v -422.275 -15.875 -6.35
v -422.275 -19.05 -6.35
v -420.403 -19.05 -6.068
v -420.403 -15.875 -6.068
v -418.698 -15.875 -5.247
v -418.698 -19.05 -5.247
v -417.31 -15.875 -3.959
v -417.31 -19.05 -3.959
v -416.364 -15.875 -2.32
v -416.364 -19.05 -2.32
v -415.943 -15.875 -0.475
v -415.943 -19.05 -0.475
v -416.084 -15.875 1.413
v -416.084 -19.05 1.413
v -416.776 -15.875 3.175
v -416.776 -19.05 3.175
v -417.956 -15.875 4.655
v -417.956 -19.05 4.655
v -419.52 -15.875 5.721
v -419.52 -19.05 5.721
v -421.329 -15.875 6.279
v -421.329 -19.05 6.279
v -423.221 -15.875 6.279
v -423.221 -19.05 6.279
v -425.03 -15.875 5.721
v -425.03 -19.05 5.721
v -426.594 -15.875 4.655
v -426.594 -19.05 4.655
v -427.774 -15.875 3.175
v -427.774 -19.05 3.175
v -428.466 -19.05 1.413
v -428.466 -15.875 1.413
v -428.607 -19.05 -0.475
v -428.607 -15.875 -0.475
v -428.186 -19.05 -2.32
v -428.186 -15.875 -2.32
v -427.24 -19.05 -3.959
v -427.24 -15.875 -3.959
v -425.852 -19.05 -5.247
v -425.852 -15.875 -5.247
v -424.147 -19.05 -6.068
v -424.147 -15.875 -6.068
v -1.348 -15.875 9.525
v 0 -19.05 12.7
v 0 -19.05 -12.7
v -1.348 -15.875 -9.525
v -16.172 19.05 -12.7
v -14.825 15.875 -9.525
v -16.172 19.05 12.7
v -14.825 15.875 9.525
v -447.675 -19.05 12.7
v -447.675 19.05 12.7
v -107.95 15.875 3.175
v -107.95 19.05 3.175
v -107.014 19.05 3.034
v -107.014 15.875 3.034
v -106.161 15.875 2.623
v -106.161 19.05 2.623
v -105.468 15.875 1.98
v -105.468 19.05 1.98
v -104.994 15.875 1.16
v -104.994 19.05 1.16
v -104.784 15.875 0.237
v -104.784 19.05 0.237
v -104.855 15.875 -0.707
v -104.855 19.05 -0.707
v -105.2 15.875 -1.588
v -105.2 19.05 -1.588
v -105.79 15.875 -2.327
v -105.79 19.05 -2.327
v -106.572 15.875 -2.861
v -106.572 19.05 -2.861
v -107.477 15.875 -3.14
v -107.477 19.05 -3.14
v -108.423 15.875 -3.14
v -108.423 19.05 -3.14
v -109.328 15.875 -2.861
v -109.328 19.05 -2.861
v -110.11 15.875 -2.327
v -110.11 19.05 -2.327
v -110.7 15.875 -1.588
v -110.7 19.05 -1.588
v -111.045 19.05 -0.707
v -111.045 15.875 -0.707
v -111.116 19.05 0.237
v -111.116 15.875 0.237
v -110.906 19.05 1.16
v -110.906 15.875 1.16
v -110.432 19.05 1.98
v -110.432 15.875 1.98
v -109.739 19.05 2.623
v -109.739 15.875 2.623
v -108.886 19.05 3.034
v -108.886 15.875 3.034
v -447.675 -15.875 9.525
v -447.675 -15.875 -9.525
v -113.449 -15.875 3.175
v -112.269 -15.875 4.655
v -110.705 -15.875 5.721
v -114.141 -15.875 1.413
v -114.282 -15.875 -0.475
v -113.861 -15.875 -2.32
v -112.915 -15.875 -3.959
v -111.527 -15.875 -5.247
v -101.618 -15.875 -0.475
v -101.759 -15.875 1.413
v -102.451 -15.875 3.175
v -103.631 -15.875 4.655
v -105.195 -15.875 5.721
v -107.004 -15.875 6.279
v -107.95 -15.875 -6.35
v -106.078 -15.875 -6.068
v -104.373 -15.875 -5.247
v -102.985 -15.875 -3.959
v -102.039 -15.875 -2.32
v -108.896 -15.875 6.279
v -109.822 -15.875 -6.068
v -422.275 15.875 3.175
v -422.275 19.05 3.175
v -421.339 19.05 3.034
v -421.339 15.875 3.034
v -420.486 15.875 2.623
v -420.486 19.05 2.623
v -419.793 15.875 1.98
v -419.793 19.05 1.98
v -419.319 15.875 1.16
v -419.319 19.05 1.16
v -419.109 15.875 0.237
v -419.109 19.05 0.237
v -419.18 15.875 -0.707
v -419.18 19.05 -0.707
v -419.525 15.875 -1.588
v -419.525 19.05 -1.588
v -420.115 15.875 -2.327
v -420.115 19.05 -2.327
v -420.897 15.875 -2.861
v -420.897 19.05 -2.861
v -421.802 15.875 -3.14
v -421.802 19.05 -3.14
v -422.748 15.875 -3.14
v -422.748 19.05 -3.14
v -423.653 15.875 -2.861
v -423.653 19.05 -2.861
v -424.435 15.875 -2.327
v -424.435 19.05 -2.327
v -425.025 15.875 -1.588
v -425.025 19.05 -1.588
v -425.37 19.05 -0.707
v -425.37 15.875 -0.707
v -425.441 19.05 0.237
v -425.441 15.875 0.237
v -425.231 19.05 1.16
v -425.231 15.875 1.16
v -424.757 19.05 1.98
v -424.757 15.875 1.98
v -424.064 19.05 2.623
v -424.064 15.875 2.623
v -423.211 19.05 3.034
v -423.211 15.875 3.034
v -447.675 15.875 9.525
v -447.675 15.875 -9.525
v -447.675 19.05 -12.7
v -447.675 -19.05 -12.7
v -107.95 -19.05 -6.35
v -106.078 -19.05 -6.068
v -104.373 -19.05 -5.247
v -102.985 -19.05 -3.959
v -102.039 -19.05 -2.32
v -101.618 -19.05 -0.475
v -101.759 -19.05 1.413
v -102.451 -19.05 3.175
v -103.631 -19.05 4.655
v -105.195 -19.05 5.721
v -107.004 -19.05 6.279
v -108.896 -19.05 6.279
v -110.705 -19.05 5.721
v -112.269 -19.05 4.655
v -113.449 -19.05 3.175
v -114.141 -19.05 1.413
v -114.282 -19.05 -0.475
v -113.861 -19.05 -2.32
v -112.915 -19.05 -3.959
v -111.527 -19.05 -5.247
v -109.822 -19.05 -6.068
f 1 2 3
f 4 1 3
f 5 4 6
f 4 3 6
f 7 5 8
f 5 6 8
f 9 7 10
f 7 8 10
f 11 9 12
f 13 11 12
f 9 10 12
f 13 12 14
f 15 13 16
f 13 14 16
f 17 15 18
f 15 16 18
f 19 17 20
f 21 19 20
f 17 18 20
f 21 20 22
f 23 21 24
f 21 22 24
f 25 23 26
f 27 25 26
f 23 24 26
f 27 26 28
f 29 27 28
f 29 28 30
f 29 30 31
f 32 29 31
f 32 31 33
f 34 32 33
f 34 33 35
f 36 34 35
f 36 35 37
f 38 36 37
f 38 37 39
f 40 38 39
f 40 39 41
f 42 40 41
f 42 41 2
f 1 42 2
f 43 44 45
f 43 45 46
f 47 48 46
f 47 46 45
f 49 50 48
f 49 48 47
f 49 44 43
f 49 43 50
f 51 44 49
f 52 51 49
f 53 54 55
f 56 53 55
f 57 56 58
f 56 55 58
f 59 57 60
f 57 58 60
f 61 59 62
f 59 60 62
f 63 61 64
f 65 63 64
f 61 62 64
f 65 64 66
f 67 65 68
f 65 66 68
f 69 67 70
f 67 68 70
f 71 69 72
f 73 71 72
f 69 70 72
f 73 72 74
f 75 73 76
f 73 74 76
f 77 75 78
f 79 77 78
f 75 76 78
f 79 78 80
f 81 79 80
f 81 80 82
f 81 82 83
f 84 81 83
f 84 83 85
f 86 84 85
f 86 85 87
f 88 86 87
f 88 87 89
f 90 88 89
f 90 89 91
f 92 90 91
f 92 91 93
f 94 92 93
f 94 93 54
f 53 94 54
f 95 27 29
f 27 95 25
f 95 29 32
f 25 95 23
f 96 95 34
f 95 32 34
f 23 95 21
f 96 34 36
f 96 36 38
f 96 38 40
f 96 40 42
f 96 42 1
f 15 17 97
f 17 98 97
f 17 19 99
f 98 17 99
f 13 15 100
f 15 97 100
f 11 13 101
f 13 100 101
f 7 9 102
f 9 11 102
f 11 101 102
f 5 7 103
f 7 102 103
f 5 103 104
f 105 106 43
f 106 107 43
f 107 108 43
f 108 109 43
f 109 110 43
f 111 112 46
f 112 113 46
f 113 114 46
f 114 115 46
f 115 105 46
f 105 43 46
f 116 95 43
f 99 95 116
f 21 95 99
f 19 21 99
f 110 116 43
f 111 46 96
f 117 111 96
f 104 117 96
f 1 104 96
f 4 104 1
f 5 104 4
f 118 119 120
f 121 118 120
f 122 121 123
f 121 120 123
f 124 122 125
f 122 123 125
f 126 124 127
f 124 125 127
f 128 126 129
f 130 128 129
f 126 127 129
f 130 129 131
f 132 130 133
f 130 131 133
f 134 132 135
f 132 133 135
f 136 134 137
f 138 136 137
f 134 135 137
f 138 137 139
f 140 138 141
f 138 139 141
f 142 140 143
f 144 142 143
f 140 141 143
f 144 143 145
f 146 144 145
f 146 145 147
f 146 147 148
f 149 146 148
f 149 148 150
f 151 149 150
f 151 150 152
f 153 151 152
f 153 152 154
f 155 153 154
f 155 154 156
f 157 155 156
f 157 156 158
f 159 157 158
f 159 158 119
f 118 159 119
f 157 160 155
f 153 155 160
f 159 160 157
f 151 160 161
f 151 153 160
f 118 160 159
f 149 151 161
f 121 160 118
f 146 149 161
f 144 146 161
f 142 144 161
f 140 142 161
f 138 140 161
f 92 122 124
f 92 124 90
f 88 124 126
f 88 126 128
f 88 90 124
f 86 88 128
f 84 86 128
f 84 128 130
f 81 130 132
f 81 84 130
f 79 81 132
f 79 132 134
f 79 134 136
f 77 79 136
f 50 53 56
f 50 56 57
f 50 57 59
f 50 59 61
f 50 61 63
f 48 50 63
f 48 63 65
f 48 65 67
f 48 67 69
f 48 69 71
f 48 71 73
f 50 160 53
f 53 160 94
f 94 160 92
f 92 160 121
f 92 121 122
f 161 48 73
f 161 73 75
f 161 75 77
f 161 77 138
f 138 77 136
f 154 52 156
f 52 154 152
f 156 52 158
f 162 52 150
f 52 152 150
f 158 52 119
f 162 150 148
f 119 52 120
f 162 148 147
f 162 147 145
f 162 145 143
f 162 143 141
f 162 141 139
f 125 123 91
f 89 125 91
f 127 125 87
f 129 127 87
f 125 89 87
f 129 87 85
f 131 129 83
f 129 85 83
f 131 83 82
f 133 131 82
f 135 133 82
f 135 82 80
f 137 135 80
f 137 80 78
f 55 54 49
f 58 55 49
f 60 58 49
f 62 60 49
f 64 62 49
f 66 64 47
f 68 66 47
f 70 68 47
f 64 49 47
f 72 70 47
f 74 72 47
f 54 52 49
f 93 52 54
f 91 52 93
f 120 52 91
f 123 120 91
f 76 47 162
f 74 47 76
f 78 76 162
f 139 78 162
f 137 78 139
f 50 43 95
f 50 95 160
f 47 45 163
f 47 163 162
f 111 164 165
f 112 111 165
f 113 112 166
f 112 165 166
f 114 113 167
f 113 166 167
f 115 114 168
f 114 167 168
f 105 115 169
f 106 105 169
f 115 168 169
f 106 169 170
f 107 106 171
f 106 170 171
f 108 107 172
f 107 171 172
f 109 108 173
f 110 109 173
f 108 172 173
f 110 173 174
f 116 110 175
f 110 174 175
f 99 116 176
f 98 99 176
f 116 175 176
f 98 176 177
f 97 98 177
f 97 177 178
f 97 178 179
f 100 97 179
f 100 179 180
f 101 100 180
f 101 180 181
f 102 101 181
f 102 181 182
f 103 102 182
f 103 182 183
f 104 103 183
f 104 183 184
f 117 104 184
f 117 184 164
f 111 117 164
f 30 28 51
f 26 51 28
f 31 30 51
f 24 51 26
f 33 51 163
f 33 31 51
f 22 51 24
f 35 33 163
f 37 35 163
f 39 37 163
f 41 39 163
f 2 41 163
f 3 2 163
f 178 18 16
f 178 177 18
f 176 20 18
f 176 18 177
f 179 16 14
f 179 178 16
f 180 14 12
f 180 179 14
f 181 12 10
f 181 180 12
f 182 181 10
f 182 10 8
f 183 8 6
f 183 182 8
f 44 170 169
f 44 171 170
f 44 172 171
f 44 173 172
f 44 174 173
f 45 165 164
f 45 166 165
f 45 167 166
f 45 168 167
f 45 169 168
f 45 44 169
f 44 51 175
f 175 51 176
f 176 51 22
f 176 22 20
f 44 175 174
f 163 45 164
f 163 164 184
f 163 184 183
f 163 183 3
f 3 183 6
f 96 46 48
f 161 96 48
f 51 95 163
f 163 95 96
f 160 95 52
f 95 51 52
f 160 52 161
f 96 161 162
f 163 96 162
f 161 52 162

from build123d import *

# Parameters (mm, degrees)
SKETCH1_W                 = 25.4
SKETCH1_H                 = 38.1
SKETCH1_W_2               = 19.05
SKETCH1_H_2               = 31.75
BEAM_DEPTH                = 447.675
MITER_CUT_DEPTH           = 449.799474292
SKETCH4_R                 = 3.175
BOLT_CLEARANCE_HOLE_DEPTH = 450.472808549
SKETCH5_R                 = 6.35
CLEARANCE_HOLE_DEPTH      = 12.7


with BuildPart() as part:
    # Sketch1 → beam (new body)
    with BuildSketch(Plane(origin=(0, 0, 0), x_dir=(0, 0, -1), z_dir=(1, 0, 0))):
        Rectangle(SKETCH1_W, SKETCH1_H)
        Rectangle(SKETCH1_W_2, SKETCH1_H_2, mode=Mode.SUBTRACT)
    extrude(amount=-BEAM_DEPTH)

    # Sketch2 → miter cut (cut, through all)
    with BuildSketch(Plane.XY.offset(12.7)):
        Polygon((0, -19.05), (-16.172490498, 19.05), (0, 19.05), align=None)
    extrude(amount=-MITER_CUT_DEPTH, mode=Mode.SUBTRACT)

    # Sketch4 → bolt clearance hole (cut, through all)
    with BuildSketch(Plane(origin=(0, 19.05, 0), x_dir=(1, 0, 0), z_dir=(0, 1, 0))):
        with Locations(Location((-422.275, 0, 0), (0, 0, 270))):
            Circle(SKETCH4_R)
        with Locations(Location((-107.95, 0, 0), (0, 0, 270))):
            Circle(SKETCH4_R)
    extrude(amount=-BOLT_CLEARANCE_HOLE_DEPTH, mode=Mode.SUBTRACT)

    # Sketch5 → clearance hole (cut)
    with BuildSketch(Plane.XZ.offset(19.05)):
        with Locations(Location((-422.275, 0, 0), (0, 0, 270))):
            Circle(SKETCH5_R)
        with Locations(Location((-107.95, 0, 0), (0, 0, 270))):
            Circle(SKETCH5_R)
    extrude(amount=-CLEARANCE_HOLE_DEPTH, mode=Mode.SUBTRACT)


solid = part.part
